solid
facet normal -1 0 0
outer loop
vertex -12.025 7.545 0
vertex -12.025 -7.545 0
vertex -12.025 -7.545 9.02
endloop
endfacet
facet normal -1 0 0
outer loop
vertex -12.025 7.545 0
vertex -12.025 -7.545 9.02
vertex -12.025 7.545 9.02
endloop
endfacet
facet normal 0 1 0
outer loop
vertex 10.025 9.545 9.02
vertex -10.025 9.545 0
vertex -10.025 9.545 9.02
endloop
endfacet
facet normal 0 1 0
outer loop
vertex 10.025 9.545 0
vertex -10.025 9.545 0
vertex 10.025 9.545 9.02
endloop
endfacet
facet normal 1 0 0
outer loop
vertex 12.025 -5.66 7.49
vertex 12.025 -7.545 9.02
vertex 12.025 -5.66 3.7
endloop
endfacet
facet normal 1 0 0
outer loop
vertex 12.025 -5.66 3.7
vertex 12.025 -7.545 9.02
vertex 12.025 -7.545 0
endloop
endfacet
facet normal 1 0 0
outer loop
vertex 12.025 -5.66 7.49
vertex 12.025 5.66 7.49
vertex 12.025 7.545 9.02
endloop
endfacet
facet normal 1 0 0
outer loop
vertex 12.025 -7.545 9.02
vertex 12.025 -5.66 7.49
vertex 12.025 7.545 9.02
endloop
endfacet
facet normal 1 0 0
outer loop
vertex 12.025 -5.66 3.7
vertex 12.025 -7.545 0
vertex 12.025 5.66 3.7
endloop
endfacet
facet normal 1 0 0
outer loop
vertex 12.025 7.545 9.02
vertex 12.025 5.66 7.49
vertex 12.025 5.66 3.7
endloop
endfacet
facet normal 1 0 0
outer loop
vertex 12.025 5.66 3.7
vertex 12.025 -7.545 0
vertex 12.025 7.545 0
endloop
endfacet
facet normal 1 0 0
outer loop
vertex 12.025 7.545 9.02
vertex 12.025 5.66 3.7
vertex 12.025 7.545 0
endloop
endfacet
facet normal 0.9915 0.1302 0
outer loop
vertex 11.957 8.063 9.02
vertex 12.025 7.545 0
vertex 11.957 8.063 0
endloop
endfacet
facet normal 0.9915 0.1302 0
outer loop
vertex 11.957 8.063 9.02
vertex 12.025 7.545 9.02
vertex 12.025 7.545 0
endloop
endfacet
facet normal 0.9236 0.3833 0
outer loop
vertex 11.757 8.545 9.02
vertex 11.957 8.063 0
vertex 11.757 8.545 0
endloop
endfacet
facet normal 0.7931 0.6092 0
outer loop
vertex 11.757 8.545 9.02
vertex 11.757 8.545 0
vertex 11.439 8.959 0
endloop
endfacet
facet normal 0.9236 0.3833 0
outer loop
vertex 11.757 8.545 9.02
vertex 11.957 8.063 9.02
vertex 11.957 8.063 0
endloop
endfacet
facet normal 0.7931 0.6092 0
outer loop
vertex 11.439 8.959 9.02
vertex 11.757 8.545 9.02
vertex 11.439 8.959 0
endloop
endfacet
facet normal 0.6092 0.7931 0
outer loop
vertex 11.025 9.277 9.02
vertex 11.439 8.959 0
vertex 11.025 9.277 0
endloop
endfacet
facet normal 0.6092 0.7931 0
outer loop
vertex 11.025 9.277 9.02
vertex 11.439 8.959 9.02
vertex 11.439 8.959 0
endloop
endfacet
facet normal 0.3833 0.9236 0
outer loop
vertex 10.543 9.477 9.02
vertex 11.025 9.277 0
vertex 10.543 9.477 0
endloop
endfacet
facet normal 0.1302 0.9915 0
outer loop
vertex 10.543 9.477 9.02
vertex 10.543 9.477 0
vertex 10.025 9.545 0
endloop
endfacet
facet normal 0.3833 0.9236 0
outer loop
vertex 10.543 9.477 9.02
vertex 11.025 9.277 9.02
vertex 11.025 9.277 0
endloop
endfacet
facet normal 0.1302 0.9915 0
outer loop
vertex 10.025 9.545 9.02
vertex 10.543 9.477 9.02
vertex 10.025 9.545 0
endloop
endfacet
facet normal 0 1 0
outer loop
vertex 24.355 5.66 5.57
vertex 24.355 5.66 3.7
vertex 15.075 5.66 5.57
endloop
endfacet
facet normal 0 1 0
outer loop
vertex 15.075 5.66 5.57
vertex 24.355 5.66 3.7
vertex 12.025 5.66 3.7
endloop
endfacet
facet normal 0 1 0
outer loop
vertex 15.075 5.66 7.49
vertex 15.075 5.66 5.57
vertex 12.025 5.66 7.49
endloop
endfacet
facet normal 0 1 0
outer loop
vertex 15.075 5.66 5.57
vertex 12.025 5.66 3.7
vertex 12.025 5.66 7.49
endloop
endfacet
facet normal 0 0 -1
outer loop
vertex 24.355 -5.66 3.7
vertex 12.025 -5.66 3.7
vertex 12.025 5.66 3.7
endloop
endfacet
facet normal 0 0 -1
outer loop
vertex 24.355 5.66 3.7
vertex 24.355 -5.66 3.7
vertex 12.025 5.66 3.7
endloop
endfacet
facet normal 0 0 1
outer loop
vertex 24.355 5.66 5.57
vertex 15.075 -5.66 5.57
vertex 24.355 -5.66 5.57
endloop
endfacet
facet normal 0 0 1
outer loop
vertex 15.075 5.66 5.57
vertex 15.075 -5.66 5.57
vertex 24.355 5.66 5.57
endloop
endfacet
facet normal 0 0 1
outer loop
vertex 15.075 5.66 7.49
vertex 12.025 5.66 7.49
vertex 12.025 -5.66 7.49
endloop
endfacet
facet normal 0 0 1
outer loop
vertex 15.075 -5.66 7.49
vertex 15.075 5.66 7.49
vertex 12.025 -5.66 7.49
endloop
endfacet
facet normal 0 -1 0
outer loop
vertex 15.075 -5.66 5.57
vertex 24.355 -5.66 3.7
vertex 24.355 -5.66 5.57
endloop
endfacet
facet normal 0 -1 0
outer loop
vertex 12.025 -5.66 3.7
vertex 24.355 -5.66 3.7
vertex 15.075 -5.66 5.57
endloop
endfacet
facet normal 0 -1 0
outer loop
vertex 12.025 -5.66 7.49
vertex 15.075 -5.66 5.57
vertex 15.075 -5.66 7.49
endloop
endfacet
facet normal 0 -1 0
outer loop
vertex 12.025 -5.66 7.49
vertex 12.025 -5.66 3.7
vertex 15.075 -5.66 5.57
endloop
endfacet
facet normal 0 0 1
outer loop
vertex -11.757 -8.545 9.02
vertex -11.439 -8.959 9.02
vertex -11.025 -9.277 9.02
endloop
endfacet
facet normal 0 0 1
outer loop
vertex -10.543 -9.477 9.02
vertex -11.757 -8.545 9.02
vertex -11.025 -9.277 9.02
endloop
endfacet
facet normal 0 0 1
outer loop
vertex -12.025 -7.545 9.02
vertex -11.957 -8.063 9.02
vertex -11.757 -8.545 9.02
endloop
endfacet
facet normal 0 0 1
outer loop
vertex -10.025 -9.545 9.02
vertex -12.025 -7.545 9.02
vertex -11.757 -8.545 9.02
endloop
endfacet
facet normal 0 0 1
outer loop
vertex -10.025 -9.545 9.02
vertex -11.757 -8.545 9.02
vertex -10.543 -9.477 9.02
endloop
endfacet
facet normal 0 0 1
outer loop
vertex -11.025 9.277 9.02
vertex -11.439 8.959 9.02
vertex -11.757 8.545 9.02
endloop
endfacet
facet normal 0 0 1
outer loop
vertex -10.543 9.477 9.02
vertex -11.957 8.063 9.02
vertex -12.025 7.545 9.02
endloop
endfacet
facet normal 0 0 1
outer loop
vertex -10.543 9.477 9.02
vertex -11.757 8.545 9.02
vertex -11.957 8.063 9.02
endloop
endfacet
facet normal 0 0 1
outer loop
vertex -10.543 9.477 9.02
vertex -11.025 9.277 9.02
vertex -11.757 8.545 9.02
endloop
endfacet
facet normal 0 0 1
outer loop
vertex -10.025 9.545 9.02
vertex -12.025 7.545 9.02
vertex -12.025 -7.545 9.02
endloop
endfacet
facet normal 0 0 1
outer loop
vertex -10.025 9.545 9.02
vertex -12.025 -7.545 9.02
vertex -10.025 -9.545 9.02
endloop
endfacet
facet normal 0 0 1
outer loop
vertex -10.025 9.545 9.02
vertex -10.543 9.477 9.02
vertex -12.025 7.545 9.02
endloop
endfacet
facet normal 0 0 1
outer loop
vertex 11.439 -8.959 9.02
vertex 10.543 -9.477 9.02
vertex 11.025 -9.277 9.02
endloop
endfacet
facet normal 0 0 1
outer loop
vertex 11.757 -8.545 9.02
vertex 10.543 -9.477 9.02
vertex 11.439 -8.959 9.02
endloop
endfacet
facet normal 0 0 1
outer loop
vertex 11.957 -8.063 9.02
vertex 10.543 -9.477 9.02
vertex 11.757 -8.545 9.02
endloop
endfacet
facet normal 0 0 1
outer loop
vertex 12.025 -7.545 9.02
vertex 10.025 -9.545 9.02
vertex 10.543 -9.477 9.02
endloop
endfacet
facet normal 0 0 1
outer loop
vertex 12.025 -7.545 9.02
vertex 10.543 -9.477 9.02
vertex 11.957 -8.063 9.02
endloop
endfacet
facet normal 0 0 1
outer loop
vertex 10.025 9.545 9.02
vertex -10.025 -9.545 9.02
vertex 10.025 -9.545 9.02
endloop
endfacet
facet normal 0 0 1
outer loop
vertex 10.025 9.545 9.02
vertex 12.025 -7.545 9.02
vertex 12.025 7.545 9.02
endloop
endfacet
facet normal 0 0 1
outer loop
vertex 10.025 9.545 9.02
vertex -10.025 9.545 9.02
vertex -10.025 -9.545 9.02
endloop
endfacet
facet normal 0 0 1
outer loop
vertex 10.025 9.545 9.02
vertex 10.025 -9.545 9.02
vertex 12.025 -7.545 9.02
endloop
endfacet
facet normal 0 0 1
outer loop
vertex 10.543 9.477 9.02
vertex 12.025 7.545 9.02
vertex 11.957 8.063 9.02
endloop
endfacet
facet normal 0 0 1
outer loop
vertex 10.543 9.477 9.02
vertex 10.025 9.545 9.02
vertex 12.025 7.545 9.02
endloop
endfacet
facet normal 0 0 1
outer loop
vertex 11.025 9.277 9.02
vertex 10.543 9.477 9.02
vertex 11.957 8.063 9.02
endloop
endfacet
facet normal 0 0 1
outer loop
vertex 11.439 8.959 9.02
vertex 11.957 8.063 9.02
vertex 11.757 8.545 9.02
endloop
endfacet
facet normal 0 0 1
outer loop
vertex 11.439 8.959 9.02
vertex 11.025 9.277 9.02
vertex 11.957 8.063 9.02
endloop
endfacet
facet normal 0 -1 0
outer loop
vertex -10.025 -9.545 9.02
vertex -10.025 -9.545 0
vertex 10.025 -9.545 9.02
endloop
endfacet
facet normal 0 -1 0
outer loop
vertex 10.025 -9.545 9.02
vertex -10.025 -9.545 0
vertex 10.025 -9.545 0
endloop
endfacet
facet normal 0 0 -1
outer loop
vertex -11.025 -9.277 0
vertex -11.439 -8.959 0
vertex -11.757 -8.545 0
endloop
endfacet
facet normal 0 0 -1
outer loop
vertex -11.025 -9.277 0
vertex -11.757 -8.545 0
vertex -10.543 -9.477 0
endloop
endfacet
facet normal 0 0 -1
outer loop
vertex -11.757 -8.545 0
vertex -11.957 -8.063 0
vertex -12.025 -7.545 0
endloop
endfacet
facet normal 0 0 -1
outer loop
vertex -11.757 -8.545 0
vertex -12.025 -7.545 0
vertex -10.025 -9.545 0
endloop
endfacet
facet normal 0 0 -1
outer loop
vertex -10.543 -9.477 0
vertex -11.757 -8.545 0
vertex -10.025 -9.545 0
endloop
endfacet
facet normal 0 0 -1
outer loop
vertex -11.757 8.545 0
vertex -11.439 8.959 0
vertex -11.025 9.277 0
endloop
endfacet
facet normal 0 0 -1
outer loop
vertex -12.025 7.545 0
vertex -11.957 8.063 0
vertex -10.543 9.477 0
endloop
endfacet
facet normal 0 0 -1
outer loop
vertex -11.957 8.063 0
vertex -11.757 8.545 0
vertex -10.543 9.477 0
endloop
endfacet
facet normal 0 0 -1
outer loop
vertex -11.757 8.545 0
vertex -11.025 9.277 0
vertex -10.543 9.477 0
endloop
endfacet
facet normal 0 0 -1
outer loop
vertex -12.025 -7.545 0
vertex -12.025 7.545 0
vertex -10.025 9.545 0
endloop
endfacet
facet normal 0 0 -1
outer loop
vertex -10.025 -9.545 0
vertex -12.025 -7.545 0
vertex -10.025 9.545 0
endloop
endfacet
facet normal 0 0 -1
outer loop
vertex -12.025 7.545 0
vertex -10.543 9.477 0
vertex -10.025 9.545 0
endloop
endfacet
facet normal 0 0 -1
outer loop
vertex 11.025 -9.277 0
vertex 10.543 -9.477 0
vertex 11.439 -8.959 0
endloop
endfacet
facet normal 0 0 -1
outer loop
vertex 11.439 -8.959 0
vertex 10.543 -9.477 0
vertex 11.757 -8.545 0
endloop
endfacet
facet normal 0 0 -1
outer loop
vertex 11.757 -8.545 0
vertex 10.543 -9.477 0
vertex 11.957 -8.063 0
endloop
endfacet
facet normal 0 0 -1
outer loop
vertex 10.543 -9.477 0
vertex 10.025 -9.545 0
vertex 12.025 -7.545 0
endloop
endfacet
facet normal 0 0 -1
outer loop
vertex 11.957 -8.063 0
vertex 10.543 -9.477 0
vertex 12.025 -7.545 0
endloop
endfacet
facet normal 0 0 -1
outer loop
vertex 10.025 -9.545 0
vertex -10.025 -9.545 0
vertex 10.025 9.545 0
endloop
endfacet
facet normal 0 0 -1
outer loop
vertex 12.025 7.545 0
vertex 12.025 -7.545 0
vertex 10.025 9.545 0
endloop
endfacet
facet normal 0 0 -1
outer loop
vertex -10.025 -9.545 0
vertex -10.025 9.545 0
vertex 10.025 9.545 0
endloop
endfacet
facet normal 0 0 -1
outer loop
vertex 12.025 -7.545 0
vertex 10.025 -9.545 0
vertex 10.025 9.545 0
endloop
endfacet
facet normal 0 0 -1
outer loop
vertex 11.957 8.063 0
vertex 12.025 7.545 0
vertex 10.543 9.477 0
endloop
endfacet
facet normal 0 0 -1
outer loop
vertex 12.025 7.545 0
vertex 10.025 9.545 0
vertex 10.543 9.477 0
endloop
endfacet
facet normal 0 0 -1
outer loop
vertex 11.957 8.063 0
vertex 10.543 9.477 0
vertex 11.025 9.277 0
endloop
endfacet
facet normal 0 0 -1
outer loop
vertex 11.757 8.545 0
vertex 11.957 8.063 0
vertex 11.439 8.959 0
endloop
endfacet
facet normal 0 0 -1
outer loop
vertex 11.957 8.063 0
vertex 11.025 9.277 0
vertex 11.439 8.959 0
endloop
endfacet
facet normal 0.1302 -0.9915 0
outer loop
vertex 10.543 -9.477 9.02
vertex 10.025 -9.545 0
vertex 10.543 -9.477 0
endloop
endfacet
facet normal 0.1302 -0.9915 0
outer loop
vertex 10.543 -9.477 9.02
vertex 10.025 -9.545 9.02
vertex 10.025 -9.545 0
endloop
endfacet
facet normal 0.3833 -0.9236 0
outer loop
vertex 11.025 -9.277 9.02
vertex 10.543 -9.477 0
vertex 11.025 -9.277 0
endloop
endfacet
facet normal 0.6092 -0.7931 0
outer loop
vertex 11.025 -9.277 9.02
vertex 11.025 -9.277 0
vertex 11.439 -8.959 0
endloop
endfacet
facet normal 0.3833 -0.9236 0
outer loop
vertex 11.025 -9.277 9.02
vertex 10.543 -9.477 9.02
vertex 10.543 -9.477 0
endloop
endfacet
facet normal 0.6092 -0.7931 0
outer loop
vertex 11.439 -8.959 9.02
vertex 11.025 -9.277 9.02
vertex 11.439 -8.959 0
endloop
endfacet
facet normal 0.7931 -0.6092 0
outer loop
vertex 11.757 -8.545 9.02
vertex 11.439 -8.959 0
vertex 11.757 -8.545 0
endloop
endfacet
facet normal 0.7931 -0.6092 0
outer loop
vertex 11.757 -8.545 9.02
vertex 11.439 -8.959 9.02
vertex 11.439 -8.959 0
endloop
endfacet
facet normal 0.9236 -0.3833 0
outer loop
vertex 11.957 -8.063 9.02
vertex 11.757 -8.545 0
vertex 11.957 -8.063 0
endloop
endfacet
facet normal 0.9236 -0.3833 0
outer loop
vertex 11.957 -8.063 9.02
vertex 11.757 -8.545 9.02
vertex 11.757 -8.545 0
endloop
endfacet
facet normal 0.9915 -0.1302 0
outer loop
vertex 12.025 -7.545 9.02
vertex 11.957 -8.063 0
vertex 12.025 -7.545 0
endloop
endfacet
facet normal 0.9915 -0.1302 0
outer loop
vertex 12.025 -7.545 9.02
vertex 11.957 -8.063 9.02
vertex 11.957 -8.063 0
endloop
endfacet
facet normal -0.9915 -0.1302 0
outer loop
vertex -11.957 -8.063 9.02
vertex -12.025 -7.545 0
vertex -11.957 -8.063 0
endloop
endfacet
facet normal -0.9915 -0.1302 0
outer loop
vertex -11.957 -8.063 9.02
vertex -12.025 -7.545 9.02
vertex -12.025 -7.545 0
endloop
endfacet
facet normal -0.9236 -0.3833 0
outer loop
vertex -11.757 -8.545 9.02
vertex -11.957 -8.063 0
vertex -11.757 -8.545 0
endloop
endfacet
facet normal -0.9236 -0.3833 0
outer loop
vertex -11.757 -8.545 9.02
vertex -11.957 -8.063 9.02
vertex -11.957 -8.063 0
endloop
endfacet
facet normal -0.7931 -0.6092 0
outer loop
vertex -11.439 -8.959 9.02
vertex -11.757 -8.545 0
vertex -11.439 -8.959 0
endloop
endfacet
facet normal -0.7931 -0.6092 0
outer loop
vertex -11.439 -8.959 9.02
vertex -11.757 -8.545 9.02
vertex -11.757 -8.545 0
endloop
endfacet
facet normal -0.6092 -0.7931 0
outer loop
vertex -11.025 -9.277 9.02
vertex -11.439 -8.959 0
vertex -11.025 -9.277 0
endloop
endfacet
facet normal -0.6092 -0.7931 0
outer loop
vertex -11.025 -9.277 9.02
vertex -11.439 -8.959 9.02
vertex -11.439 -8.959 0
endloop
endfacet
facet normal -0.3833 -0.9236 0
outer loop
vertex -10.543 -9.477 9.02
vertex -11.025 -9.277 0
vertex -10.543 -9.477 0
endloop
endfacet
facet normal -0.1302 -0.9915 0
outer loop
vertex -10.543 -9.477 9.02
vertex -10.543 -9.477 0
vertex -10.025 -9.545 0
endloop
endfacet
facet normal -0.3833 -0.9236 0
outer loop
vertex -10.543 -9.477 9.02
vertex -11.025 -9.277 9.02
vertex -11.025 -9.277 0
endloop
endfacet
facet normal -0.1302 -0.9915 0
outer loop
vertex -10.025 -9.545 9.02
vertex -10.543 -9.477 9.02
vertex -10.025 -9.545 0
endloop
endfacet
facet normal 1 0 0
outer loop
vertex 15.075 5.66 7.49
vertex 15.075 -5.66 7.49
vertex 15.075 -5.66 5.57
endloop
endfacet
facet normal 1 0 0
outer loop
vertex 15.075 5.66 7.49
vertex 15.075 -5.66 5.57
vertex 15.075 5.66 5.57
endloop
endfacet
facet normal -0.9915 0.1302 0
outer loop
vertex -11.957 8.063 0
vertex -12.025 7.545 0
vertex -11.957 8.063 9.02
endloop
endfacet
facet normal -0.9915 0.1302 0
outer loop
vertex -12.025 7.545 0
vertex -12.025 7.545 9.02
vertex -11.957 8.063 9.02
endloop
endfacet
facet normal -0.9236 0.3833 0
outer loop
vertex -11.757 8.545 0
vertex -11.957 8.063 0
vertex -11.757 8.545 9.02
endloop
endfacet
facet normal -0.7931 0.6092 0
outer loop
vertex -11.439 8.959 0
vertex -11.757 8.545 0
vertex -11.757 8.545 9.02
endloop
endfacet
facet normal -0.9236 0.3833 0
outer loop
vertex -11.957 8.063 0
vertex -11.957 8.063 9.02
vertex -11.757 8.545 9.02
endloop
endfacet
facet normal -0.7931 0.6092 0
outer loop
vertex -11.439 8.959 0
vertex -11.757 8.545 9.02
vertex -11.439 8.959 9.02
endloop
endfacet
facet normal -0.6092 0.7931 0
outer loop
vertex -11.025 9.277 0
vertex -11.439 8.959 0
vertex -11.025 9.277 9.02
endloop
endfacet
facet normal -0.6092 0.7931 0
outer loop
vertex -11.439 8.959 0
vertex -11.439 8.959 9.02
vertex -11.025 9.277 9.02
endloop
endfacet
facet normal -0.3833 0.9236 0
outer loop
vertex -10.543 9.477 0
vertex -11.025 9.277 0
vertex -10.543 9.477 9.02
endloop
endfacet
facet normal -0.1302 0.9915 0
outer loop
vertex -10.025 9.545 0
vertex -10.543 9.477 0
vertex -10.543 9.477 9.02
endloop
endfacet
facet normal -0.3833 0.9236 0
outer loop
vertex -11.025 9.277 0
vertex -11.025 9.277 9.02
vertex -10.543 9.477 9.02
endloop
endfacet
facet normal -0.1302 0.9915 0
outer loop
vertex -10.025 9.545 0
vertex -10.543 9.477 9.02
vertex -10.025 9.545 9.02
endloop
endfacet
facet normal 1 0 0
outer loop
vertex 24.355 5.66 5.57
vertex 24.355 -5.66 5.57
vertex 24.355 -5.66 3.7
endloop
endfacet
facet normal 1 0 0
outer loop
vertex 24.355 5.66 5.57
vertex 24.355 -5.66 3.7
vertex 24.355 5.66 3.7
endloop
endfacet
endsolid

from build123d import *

# Parameters (mm, degrees)
F0_W     = 24.05
F0_H     = 19.09
F1_DEPTH = 9.02
F2_R     = 2
F4_DEPTH = 3.05
F5_W     = 11.32
F5_H     = 1.87
F6_DEPTH = 12.33


with BuildPart() as f1:
    # F0 (on Top) → F1 (new body)
    with BuildSketch(Plane.XY):
        Rectangle(F0_W, F0_H)
    extrude(amount=F1_DEPTH)

    # F2
    f2_edges = [f1.edges().sort_by_distance(p)[0] for p in [
        (12.025, -9.545, 4.51),
        (12.025, 9.545, 4.51),
        (-12.025, 9.545, 4.51),
        (-12.025, -9.545, 4.51),
    ]]
    fillet(f2_edges, radius=F2_R)

    # F3 (on face) → F4 (join)
    with BuildSketch(Plane.YZ.offset(12.025)):
        Polygon((0, 7.49), (-5.66, 7.49), (-5.66, 5.57), (5.66, 5.57), (5.66, 7.49), align=None)
    extrude(amount=F4_DEPTH)

    # F5 (on face) → F6 (join)
    with BuildSketch(Plane.YZ.offset(12.025)):
        with Locations((0, 4.635)):
            Rectangle(F5_W, F5_H)
    extrude(amount=F6_DEPTH)


solid = f1.part
